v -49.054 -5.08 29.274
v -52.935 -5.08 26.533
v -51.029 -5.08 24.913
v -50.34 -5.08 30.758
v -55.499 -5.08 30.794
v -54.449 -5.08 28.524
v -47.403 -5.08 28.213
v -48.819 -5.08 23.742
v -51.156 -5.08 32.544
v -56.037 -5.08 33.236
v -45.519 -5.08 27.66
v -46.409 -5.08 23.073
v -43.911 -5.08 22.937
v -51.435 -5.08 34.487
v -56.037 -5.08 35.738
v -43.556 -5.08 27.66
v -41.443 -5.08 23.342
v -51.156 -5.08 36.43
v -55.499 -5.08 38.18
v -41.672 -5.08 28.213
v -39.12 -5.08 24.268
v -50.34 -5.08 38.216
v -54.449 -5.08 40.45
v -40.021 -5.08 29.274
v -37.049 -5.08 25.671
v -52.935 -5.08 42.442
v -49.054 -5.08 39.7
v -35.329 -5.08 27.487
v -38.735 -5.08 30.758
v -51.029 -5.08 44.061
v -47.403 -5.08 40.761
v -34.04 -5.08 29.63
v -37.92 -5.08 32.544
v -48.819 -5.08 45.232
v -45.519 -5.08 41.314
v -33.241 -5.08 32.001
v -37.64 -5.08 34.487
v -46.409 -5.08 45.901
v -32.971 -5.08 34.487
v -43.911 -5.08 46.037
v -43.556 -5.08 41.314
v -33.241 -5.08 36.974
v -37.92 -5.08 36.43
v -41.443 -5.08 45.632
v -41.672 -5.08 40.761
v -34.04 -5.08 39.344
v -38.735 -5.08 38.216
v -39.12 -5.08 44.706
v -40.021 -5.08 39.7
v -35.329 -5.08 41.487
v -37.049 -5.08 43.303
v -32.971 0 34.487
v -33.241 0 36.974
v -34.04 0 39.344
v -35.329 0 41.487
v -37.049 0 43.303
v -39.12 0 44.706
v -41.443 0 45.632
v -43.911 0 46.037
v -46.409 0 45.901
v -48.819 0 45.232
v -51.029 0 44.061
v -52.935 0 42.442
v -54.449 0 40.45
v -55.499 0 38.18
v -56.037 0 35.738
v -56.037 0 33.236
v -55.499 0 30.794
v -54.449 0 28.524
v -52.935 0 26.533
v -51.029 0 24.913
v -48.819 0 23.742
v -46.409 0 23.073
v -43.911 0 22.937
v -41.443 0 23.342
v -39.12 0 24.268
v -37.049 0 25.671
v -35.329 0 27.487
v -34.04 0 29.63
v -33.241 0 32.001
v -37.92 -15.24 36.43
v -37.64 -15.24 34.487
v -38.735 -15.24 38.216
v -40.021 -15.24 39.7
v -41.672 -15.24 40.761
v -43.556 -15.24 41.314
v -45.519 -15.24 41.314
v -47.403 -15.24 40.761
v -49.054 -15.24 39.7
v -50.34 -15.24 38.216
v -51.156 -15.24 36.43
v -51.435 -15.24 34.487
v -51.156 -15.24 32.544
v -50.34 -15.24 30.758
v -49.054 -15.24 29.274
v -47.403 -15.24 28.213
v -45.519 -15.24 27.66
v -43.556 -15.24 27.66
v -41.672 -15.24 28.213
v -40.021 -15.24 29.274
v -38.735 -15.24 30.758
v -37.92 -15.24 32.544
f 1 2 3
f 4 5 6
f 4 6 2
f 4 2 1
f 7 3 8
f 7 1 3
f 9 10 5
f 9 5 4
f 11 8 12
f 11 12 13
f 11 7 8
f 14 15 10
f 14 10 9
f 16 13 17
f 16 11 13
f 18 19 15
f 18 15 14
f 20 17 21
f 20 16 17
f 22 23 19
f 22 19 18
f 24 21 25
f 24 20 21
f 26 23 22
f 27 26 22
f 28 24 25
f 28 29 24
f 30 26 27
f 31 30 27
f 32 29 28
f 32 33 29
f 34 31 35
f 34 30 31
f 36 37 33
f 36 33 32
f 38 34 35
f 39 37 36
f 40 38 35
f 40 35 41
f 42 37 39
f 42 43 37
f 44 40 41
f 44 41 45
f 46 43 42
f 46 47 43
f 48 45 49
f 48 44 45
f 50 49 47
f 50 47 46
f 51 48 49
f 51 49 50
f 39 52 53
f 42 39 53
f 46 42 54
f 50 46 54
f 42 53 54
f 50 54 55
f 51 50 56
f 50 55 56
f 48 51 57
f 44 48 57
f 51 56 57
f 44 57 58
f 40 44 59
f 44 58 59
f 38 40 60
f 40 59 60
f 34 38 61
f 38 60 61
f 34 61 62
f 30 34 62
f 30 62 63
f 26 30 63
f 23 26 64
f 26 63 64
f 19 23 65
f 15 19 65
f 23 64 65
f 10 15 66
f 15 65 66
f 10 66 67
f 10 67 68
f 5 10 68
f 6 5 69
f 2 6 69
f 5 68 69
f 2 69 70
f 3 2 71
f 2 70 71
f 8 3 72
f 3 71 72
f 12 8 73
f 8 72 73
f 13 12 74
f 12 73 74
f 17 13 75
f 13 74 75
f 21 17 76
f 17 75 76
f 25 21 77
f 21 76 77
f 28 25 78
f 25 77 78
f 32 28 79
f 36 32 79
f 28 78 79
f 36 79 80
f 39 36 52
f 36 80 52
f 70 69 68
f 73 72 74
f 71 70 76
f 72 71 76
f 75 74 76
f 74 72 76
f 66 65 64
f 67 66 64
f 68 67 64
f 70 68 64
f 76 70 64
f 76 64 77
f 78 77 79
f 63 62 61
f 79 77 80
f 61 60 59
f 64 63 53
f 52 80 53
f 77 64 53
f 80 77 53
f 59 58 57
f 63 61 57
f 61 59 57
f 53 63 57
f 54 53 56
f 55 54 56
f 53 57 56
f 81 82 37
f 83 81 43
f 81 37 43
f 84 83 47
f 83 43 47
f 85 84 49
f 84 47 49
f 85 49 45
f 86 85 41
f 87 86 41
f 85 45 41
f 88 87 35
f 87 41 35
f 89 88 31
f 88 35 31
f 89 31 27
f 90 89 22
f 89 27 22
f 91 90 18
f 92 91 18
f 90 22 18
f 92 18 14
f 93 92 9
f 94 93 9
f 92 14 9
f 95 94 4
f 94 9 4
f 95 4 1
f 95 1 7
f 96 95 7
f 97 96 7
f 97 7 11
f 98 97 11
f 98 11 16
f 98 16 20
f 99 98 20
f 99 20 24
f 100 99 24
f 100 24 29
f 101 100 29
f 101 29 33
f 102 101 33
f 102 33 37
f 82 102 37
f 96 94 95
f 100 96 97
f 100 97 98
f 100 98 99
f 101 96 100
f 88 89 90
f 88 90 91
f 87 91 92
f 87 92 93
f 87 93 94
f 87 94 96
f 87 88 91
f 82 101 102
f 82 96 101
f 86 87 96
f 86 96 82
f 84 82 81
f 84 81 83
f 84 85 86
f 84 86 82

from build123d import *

# Parameters (mm, degrees)
F0_R     = 11.566794
F1_DEPTH = 5.08
F2_R     = 6.495217
F3_DEPTH = 2.54
F4_R     = 6.897415
F5_DEPTH = 12.7


with BuildPart() as f1:
    # F0 (on Front) → F1 (new body)
    with BuildSketch(Plane.XZ):
        with Locations((-44.537589, 34.487069)):
            Circle(F0_R)
    extrude(amount=F1_DEPTH)

    # F2 (on face) → F3 (cut)
    with BuildSketch(Plane.XZ.offset(5.08)):
        with Locations((-44.537589, 34.487069)):
            Circle(F2_R)
    extrude(amount=-F3_DEPTH, mode=Mode.SUBTRACT)

    # F4 (on face) → F5 (join)
    with BuildSketch(Plane.XZ.offset(2.54)):
        with Locations((-44.537589, 34.487069)):
            Circle(F4_R)
    extrude(amount=F5_DEPTH)


solid = f1.part
